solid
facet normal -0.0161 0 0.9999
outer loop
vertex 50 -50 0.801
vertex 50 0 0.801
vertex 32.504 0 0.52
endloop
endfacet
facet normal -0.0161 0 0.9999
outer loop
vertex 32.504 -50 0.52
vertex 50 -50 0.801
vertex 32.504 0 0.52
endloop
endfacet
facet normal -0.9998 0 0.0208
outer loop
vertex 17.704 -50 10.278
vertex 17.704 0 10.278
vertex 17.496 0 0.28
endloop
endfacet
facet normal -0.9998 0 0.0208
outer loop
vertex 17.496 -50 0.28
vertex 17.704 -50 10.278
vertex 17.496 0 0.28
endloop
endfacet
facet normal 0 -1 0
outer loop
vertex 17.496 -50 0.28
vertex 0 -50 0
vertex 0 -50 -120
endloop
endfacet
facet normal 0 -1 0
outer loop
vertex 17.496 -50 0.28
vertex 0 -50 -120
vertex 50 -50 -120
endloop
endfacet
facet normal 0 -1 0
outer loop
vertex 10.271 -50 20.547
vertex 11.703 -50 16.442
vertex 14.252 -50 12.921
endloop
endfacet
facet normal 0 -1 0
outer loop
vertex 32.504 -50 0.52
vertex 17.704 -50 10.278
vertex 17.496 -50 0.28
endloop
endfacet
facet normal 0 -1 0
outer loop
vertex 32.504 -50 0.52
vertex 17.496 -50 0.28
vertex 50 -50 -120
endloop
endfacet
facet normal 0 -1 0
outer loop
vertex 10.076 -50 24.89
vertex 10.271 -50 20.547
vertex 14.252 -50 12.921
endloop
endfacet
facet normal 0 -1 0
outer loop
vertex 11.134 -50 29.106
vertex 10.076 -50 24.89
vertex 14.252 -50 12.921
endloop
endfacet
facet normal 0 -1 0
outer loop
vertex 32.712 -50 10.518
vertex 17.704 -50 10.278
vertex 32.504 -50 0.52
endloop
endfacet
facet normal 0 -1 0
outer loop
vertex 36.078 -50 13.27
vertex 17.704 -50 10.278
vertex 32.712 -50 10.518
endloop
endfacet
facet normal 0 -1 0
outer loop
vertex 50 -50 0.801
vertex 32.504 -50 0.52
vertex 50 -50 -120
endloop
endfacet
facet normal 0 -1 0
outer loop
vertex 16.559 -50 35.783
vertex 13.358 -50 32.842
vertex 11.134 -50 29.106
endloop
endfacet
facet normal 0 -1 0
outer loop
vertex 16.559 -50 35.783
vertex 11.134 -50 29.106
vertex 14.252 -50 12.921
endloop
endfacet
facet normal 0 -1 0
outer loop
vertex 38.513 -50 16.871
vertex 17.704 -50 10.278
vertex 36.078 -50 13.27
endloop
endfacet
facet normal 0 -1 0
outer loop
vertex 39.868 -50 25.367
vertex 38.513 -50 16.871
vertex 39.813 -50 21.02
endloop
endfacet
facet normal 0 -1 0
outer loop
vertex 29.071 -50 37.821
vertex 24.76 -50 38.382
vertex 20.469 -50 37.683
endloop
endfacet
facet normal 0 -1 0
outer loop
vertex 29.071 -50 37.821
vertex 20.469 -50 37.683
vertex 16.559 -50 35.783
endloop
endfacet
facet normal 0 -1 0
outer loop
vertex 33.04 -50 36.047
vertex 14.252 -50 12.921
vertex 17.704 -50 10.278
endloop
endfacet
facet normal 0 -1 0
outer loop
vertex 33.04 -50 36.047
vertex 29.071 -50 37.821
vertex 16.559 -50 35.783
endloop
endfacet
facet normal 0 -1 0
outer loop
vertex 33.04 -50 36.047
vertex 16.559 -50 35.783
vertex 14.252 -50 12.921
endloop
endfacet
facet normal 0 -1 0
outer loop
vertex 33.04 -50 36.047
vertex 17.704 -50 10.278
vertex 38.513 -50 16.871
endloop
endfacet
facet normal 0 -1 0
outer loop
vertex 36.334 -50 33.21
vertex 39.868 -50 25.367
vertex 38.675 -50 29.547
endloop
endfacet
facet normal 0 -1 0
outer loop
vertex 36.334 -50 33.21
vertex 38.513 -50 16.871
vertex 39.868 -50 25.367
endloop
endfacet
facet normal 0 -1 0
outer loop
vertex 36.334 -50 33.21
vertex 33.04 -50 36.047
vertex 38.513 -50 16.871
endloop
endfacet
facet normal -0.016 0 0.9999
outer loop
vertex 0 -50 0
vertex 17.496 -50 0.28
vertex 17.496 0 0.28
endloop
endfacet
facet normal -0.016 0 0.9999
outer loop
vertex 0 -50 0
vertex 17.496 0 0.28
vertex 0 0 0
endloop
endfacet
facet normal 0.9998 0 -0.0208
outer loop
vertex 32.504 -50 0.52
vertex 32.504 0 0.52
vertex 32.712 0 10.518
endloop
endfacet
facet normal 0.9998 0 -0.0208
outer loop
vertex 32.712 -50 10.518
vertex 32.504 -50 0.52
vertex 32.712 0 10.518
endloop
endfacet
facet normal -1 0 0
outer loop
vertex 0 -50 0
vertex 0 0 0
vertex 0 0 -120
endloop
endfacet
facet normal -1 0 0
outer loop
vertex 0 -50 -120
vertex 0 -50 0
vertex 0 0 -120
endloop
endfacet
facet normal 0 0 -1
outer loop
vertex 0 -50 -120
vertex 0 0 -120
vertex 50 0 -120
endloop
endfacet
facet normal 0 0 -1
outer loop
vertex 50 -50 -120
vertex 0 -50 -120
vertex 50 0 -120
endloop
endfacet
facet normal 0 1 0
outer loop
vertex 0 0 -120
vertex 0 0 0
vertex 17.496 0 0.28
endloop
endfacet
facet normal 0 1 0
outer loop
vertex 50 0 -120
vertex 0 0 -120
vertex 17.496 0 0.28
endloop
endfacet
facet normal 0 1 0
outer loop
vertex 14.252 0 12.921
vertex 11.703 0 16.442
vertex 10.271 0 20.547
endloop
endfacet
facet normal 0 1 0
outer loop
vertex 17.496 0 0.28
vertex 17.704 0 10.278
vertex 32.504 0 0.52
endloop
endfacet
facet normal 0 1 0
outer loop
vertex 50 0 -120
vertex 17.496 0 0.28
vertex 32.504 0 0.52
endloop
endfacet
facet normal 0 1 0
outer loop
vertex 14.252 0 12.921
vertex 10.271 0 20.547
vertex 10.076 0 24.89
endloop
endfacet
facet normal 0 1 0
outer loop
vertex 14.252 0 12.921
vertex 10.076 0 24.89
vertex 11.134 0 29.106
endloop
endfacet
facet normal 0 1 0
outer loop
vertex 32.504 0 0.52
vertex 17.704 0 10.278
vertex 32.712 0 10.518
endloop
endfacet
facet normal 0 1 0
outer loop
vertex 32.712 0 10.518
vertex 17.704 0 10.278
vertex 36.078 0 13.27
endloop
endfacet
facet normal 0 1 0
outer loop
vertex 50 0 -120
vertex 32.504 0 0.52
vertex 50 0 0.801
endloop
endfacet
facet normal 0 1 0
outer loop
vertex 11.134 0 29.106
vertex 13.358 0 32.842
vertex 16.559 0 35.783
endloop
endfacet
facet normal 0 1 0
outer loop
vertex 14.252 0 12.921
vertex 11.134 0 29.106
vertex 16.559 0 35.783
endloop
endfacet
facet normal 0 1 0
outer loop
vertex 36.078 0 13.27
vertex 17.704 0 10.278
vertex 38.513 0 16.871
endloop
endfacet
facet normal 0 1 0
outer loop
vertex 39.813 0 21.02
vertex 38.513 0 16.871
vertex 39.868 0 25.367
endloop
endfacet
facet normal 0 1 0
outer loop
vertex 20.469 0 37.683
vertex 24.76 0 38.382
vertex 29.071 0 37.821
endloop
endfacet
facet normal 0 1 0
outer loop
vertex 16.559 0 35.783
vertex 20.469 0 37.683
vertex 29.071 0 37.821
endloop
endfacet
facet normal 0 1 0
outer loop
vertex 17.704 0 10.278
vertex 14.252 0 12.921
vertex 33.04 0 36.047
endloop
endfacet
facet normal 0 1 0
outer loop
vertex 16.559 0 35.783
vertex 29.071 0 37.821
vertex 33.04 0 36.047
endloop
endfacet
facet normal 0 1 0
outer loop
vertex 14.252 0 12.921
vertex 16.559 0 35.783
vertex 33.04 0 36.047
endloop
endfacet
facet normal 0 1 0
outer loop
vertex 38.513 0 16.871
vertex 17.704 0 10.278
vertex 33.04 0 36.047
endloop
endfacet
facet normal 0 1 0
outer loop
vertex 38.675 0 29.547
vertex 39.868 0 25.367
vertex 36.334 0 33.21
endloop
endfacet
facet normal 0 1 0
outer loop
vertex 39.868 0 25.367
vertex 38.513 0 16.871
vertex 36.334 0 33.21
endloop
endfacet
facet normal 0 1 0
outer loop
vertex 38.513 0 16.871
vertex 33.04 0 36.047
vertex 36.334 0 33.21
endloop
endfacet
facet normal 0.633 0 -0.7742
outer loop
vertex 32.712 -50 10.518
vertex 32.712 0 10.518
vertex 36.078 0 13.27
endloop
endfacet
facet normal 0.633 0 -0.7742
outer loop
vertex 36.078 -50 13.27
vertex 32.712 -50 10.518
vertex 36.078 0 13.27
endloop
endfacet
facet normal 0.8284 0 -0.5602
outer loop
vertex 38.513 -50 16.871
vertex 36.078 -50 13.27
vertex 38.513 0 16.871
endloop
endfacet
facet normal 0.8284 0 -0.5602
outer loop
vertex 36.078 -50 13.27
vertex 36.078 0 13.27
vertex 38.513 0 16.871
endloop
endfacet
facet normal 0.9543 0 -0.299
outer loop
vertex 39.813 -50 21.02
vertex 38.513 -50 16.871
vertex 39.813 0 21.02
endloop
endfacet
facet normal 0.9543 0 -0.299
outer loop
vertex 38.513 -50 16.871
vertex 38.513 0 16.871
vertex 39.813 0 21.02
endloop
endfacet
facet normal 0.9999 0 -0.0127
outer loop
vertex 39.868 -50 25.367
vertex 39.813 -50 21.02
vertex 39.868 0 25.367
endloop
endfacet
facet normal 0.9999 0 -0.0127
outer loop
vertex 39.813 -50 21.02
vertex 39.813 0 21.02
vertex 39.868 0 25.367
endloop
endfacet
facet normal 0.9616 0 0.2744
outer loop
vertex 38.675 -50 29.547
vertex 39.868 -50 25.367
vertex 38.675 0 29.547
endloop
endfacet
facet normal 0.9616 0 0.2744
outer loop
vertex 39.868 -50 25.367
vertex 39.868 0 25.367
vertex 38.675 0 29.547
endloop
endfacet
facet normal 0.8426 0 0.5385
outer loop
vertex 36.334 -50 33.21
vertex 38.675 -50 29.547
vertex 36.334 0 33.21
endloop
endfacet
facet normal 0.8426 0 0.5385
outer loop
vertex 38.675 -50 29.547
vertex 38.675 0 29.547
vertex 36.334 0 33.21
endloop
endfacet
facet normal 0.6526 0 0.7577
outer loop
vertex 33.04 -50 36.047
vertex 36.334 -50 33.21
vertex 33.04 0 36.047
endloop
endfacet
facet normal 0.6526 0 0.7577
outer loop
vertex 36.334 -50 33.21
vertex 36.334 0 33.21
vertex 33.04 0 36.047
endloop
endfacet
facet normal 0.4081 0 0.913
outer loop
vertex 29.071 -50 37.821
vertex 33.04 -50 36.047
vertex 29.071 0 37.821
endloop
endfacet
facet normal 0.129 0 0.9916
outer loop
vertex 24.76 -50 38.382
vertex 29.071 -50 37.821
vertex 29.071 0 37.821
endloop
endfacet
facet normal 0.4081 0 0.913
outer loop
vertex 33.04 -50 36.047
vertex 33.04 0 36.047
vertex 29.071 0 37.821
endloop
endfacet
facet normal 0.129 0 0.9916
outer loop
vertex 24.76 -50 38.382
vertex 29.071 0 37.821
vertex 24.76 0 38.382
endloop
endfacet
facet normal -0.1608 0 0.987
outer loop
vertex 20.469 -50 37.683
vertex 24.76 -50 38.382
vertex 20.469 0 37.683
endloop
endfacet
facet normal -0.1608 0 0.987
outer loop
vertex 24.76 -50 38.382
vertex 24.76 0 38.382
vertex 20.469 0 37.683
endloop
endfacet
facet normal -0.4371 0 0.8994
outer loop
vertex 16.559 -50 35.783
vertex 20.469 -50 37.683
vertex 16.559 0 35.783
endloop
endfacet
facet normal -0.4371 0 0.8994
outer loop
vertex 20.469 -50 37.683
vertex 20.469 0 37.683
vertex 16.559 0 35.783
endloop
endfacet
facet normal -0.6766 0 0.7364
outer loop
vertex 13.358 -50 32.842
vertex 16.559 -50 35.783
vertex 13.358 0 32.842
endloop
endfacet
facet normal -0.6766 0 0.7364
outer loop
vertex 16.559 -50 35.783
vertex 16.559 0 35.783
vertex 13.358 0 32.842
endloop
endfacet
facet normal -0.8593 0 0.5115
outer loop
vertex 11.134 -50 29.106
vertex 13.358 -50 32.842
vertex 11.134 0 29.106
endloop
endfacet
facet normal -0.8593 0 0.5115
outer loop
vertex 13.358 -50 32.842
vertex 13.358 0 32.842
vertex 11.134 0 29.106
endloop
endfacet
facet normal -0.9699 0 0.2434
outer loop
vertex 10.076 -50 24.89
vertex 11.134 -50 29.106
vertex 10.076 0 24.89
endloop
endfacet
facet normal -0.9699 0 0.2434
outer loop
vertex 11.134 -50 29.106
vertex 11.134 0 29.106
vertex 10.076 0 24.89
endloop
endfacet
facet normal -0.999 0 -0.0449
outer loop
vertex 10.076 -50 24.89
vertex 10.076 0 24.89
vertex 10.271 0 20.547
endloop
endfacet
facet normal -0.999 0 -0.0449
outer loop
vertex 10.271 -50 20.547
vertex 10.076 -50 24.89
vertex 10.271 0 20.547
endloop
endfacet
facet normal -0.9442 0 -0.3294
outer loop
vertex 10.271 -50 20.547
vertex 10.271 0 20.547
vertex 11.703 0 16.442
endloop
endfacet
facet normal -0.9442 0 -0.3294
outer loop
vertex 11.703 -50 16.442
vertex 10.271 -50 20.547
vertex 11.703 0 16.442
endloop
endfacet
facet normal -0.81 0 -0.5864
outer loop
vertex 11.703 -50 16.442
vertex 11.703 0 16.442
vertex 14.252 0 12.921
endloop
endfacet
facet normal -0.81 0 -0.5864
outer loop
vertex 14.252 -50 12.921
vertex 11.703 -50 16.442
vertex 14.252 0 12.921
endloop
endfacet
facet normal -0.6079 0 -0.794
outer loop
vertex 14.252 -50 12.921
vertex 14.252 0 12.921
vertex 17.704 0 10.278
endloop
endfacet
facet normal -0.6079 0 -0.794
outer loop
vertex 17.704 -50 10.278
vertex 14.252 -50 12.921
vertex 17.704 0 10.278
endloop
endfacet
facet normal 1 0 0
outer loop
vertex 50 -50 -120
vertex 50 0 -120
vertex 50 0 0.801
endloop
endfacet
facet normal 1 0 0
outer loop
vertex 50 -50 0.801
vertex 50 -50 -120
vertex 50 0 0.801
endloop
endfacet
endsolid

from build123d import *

# Parameters (mm, degrees)
F1_DEPTH = 50


# Not quite as in the source:
# - a feature names something its author has since deleted; it is built from what else it names


with BuildPart() as f1:
    # F0 (on Front) → F1 (new body)
    with BuildSketch(Plane.XZ):
        with BuildLine():
            Line((0, 0), (0, -120))
            Line((0, -120), (50, -120))
            Line((50, -120), (50, 0.8005096136))
            Line((50, 0.8005096136), (32.5041198008, 0.5203972077))
            Line((32.5041198008, 0.5203972077), (32.7120246633, 10.5182357525))
            ThreePointArc((32.7120246633, 10.5182357525), (25.2401221113, 8.3857971686), (17.7037850617, 10.2779509508))
            Line((17.7037850617, 10.2779509508), (17.4958801992, 0.280112406))
            Line((17.4958801992, 0.280112406), (0, 0))
        make_face()
        with BuildLine():
            ThreePointArc((40, 23.3838750912), (17.3987903619, 36.3152946589), (17.7037850617, 10.2779509508))
            ThreePointArc((17.7037850617, 10.2779509508), (25.2401221113, 8.3857971686), (32.7120246633, 10.5182357525))
            ThreePointArc((32.7120246633, 10.5182357525), (38.0514437889, 15.9906474452), (40, 23.3838750912))
        make_face()
    extrude(amount=F1_DEPTH)


solid = f1.part
